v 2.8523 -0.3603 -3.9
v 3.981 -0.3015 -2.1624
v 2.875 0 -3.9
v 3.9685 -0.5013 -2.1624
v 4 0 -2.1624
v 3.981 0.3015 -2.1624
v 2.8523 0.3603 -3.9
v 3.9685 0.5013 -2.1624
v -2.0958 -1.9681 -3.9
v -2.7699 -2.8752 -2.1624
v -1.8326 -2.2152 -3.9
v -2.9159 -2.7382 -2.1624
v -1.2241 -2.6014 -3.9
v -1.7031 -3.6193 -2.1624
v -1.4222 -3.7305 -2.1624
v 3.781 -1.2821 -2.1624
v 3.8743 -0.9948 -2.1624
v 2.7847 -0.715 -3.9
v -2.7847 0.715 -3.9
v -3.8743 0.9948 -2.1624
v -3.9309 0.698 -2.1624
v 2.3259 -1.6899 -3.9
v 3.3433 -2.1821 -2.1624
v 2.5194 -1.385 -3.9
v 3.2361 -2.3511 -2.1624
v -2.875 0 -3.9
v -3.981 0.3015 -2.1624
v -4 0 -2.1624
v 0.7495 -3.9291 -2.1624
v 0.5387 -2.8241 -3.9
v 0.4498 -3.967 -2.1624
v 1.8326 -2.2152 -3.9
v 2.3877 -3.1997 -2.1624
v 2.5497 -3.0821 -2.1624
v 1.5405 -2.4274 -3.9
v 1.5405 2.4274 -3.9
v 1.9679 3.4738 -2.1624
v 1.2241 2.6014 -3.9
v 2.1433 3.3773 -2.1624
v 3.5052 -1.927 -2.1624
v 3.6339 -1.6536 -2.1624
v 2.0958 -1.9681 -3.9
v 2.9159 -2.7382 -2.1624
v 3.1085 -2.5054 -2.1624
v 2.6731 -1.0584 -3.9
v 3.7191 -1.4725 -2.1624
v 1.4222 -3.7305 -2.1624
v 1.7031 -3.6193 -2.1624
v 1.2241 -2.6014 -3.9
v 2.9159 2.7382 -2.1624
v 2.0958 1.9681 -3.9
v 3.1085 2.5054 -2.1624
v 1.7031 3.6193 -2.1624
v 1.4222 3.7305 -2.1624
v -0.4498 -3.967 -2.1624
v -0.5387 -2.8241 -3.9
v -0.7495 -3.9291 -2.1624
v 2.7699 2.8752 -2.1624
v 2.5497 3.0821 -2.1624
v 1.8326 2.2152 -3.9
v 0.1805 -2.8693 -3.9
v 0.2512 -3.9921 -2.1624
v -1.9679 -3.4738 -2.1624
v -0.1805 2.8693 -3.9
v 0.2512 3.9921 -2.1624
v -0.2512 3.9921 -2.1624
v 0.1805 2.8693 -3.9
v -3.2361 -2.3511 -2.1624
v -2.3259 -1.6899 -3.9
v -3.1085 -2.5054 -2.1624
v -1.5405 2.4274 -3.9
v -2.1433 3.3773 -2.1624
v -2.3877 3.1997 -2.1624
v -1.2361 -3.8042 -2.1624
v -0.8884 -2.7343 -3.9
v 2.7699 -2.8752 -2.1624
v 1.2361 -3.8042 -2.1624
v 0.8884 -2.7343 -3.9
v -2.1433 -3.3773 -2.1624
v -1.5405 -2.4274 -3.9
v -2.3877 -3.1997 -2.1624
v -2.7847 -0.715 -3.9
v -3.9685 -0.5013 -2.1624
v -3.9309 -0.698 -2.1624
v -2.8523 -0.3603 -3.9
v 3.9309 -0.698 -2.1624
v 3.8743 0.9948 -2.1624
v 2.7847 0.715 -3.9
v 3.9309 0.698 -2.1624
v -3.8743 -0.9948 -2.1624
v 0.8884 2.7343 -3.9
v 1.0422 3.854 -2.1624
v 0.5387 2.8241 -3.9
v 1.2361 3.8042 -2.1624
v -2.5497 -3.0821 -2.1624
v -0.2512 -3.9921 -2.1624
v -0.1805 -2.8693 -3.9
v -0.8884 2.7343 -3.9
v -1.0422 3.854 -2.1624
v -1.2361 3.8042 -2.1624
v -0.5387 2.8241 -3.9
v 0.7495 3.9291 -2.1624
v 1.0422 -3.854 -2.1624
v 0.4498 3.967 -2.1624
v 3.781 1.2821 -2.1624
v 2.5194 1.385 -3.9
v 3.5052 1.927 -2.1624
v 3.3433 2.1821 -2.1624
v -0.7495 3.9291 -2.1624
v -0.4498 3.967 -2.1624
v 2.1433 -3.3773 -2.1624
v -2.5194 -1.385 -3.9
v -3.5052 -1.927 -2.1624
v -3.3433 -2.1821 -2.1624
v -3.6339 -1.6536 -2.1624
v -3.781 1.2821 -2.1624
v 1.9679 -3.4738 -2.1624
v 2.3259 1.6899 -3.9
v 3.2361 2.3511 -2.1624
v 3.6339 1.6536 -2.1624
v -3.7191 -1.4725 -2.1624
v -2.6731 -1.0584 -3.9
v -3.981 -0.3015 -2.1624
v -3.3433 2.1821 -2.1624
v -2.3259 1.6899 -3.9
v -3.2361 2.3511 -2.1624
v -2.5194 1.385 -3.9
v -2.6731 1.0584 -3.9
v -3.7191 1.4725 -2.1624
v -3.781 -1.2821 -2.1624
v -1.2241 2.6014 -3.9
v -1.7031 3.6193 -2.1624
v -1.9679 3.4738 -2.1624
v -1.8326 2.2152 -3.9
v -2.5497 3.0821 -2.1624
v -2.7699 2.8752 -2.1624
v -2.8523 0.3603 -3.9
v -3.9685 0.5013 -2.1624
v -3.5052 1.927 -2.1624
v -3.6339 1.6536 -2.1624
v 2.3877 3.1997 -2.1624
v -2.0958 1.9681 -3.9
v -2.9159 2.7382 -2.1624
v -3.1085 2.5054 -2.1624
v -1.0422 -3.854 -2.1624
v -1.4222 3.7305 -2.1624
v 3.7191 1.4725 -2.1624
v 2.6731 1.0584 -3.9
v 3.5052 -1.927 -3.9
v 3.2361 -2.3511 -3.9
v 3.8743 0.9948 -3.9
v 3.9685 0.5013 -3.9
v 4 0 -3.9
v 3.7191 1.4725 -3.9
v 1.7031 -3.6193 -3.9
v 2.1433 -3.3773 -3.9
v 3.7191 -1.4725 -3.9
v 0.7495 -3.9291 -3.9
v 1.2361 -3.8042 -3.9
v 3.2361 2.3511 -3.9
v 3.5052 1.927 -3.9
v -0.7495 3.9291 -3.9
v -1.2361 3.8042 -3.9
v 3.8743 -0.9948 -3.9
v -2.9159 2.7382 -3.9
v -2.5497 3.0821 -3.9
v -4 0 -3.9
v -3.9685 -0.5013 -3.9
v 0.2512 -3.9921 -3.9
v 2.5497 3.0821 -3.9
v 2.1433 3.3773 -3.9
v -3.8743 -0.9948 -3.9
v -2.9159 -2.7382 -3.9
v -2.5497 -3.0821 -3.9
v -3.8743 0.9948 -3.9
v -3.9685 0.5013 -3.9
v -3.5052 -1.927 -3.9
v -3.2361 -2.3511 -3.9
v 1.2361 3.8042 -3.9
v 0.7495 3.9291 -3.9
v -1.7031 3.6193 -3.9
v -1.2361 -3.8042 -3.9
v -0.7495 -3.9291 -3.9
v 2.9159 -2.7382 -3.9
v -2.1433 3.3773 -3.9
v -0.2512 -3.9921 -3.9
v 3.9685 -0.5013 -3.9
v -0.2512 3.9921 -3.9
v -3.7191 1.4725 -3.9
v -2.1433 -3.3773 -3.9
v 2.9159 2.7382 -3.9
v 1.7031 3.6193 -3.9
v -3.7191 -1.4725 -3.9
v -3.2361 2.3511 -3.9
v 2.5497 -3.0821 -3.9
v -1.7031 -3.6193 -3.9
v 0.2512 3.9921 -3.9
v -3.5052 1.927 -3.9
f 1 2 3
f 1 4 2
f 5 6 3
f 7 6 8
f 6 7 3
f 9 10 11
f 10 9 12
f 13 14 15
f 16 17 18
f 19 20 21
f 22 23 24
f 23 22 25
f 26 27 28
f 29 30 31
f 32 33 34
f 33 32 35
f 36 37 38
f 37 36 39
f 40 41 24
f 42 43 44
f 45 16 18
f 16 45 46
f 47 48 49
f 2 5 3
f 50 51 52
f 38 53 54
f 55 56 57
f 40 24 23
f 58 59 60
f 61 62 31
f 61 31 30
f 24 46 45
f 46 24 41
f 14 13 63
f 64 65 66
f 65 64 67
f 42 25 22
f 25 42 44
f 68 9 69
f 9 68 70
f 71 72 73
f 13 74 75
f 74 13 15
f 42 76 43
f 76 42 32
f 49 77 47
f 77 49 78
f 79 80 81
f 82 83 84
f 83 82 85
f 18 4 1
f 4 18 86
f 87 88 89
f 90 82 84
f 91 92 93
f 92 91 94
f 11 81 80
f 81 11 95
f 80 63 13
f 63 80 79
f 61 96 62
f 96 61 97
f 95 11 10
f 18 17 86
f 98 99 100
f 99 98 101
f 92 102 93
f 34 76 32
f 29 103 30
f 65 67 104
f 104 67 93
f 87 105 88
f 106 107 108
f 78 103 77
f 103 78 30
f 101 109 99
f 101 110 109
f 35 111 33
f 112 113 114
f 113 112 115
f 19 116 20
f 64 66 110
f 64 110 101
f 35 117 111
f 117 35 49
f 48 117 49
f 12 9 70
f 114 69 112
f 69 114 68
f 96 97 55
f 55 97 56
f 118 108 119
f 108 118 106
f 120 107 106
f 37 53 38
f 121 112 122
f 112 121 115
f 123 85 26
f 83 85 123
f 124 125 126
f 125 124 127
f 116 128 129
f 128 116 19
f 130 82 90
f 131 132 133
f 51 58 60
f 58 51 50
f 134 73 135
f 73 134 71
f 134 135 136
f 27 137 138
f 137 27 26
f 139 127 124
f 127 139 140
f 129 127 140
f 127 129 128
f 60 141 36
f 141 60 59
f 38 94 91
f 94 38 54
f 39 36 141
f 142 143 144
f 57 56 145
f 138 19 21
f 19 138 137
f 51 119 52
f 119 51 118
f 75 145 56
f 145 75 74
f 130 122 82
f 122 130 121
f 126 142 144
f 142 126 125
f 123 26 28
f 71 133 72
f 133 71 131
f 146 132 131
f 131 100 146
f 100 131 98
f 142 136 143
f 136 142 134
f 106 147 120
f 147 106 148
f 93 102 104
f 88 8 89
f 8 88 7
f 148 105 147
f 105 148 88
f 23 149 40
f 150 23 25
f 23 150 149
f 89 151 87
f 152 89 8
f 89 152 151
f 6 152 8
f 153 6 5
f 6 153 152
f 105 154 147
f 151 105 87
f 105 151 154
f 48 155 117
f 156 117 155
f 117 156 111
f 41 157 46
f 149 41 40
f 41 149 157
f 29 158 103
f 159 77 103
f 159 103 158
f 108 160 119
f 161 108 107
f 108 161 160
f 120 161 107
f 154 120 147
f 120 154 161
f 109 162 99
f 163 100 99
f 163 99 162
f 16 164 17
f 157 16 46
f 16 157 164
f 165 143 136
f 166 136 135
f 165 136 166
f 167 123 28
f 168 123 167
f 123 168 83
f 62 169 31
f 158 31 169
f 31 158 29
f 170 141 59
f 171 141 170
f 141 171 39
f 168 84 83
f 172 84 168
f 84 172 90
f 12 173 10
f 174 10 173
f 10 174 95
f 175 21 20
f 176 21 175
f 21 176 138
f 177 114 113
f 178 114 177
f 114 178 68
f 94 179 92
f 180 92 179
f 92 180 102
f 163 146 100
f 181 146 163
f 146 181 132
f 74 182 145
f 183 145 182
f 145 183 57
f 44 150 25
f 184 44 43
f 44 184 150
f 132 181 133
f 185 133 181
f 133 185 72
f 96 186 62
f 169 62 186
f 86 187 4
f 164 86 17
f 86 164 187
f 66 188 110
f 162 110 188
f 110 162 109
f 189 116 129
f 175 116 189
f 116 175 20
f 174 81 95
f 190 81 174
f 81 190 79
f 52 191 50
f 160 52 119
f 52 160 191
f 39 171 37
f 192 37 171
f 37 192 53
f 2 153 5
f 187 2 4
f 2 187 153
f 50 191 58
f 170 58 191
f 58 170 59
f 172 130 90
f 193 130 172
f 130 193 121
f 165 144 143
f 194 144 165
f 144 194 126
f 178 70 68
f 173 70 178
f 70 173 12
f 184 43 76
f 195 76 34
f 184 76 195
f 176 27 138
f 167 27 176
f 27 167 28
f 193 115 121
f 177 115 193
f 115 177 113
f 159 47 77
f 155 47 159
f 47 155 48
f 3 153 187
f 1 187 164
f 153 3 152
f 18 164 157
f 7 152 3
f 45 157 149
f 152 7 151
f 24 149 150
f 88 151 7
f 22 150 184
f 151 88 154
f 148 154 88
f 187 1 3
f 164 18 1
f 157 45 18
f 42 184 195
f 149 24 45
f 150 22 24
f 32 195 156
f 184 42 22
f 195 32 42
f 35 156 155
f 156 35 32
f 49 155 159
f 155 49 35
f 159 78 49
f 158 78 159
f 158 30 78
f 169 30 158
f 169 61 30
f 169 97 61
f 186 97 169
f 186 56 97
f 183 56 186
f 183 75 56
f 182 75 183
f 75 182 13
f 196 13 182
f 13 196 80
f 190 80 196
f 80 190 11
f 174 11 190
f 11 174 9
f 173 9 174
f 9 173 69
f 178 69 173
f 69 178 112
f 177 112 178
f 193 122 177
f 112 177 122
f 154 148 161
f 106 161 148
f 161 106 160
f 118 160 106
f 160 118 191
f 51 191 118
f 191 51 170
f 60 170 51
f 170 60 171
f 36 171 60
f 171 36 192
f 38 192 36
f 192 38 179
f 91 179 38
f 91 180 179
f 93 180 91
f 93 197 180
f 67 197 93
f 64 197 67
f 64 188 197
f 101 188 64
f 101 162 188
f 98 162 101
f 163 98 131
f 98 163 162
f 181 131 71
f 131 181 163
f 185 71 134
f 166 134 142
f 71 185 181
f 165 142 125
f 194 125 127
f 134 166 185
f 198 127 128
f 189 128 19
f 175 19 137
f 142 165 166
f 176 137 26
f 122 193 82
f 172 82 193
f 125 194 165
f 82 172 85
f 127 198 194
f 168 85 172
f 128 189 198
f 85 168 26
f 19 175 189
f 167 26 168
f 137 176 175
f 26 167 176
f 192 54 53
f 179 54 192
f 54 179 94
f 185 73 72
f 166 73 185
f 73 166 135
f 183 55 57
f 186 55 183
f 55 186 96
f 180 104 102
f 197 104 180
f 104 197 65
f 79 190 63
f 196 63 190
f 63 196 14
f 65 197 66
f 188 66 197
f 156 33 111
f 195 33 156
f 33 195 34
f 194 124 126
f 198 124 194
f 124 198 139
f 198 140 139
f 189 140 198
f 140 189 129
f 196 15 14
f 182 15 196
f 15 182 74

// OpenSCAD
$fn = 50;

difference() {
	union() {
		translate(v = [0, 0, -3.9]) {
			cylinder(h = 3.9, r = 4.0);
		}
	}
	union() {
		translate(v = [0, 0, 0]) {
			rotate(a = [0, 0, 0]) {
				difference() {
					union() {
						translate(v = [0, 0, -6.9]) {
							cylinder(h = 6.9, r = 2.6);
						}
						translate(v = [0, 0, -3.9]) {
							cylinder(h = 3.9, r1 = 2.875, r2 = 5.4);
						}
						translate(v = [0, 0, -6.9]) {
							cylinder(h = 6.9, r = 2.875);
						}
						translate(v = [0, 0, -6.9]) {
							cylinder(h = 6.9, r = 2.6);
						}
					}
					union();
				}
			}
		}
	}
}
